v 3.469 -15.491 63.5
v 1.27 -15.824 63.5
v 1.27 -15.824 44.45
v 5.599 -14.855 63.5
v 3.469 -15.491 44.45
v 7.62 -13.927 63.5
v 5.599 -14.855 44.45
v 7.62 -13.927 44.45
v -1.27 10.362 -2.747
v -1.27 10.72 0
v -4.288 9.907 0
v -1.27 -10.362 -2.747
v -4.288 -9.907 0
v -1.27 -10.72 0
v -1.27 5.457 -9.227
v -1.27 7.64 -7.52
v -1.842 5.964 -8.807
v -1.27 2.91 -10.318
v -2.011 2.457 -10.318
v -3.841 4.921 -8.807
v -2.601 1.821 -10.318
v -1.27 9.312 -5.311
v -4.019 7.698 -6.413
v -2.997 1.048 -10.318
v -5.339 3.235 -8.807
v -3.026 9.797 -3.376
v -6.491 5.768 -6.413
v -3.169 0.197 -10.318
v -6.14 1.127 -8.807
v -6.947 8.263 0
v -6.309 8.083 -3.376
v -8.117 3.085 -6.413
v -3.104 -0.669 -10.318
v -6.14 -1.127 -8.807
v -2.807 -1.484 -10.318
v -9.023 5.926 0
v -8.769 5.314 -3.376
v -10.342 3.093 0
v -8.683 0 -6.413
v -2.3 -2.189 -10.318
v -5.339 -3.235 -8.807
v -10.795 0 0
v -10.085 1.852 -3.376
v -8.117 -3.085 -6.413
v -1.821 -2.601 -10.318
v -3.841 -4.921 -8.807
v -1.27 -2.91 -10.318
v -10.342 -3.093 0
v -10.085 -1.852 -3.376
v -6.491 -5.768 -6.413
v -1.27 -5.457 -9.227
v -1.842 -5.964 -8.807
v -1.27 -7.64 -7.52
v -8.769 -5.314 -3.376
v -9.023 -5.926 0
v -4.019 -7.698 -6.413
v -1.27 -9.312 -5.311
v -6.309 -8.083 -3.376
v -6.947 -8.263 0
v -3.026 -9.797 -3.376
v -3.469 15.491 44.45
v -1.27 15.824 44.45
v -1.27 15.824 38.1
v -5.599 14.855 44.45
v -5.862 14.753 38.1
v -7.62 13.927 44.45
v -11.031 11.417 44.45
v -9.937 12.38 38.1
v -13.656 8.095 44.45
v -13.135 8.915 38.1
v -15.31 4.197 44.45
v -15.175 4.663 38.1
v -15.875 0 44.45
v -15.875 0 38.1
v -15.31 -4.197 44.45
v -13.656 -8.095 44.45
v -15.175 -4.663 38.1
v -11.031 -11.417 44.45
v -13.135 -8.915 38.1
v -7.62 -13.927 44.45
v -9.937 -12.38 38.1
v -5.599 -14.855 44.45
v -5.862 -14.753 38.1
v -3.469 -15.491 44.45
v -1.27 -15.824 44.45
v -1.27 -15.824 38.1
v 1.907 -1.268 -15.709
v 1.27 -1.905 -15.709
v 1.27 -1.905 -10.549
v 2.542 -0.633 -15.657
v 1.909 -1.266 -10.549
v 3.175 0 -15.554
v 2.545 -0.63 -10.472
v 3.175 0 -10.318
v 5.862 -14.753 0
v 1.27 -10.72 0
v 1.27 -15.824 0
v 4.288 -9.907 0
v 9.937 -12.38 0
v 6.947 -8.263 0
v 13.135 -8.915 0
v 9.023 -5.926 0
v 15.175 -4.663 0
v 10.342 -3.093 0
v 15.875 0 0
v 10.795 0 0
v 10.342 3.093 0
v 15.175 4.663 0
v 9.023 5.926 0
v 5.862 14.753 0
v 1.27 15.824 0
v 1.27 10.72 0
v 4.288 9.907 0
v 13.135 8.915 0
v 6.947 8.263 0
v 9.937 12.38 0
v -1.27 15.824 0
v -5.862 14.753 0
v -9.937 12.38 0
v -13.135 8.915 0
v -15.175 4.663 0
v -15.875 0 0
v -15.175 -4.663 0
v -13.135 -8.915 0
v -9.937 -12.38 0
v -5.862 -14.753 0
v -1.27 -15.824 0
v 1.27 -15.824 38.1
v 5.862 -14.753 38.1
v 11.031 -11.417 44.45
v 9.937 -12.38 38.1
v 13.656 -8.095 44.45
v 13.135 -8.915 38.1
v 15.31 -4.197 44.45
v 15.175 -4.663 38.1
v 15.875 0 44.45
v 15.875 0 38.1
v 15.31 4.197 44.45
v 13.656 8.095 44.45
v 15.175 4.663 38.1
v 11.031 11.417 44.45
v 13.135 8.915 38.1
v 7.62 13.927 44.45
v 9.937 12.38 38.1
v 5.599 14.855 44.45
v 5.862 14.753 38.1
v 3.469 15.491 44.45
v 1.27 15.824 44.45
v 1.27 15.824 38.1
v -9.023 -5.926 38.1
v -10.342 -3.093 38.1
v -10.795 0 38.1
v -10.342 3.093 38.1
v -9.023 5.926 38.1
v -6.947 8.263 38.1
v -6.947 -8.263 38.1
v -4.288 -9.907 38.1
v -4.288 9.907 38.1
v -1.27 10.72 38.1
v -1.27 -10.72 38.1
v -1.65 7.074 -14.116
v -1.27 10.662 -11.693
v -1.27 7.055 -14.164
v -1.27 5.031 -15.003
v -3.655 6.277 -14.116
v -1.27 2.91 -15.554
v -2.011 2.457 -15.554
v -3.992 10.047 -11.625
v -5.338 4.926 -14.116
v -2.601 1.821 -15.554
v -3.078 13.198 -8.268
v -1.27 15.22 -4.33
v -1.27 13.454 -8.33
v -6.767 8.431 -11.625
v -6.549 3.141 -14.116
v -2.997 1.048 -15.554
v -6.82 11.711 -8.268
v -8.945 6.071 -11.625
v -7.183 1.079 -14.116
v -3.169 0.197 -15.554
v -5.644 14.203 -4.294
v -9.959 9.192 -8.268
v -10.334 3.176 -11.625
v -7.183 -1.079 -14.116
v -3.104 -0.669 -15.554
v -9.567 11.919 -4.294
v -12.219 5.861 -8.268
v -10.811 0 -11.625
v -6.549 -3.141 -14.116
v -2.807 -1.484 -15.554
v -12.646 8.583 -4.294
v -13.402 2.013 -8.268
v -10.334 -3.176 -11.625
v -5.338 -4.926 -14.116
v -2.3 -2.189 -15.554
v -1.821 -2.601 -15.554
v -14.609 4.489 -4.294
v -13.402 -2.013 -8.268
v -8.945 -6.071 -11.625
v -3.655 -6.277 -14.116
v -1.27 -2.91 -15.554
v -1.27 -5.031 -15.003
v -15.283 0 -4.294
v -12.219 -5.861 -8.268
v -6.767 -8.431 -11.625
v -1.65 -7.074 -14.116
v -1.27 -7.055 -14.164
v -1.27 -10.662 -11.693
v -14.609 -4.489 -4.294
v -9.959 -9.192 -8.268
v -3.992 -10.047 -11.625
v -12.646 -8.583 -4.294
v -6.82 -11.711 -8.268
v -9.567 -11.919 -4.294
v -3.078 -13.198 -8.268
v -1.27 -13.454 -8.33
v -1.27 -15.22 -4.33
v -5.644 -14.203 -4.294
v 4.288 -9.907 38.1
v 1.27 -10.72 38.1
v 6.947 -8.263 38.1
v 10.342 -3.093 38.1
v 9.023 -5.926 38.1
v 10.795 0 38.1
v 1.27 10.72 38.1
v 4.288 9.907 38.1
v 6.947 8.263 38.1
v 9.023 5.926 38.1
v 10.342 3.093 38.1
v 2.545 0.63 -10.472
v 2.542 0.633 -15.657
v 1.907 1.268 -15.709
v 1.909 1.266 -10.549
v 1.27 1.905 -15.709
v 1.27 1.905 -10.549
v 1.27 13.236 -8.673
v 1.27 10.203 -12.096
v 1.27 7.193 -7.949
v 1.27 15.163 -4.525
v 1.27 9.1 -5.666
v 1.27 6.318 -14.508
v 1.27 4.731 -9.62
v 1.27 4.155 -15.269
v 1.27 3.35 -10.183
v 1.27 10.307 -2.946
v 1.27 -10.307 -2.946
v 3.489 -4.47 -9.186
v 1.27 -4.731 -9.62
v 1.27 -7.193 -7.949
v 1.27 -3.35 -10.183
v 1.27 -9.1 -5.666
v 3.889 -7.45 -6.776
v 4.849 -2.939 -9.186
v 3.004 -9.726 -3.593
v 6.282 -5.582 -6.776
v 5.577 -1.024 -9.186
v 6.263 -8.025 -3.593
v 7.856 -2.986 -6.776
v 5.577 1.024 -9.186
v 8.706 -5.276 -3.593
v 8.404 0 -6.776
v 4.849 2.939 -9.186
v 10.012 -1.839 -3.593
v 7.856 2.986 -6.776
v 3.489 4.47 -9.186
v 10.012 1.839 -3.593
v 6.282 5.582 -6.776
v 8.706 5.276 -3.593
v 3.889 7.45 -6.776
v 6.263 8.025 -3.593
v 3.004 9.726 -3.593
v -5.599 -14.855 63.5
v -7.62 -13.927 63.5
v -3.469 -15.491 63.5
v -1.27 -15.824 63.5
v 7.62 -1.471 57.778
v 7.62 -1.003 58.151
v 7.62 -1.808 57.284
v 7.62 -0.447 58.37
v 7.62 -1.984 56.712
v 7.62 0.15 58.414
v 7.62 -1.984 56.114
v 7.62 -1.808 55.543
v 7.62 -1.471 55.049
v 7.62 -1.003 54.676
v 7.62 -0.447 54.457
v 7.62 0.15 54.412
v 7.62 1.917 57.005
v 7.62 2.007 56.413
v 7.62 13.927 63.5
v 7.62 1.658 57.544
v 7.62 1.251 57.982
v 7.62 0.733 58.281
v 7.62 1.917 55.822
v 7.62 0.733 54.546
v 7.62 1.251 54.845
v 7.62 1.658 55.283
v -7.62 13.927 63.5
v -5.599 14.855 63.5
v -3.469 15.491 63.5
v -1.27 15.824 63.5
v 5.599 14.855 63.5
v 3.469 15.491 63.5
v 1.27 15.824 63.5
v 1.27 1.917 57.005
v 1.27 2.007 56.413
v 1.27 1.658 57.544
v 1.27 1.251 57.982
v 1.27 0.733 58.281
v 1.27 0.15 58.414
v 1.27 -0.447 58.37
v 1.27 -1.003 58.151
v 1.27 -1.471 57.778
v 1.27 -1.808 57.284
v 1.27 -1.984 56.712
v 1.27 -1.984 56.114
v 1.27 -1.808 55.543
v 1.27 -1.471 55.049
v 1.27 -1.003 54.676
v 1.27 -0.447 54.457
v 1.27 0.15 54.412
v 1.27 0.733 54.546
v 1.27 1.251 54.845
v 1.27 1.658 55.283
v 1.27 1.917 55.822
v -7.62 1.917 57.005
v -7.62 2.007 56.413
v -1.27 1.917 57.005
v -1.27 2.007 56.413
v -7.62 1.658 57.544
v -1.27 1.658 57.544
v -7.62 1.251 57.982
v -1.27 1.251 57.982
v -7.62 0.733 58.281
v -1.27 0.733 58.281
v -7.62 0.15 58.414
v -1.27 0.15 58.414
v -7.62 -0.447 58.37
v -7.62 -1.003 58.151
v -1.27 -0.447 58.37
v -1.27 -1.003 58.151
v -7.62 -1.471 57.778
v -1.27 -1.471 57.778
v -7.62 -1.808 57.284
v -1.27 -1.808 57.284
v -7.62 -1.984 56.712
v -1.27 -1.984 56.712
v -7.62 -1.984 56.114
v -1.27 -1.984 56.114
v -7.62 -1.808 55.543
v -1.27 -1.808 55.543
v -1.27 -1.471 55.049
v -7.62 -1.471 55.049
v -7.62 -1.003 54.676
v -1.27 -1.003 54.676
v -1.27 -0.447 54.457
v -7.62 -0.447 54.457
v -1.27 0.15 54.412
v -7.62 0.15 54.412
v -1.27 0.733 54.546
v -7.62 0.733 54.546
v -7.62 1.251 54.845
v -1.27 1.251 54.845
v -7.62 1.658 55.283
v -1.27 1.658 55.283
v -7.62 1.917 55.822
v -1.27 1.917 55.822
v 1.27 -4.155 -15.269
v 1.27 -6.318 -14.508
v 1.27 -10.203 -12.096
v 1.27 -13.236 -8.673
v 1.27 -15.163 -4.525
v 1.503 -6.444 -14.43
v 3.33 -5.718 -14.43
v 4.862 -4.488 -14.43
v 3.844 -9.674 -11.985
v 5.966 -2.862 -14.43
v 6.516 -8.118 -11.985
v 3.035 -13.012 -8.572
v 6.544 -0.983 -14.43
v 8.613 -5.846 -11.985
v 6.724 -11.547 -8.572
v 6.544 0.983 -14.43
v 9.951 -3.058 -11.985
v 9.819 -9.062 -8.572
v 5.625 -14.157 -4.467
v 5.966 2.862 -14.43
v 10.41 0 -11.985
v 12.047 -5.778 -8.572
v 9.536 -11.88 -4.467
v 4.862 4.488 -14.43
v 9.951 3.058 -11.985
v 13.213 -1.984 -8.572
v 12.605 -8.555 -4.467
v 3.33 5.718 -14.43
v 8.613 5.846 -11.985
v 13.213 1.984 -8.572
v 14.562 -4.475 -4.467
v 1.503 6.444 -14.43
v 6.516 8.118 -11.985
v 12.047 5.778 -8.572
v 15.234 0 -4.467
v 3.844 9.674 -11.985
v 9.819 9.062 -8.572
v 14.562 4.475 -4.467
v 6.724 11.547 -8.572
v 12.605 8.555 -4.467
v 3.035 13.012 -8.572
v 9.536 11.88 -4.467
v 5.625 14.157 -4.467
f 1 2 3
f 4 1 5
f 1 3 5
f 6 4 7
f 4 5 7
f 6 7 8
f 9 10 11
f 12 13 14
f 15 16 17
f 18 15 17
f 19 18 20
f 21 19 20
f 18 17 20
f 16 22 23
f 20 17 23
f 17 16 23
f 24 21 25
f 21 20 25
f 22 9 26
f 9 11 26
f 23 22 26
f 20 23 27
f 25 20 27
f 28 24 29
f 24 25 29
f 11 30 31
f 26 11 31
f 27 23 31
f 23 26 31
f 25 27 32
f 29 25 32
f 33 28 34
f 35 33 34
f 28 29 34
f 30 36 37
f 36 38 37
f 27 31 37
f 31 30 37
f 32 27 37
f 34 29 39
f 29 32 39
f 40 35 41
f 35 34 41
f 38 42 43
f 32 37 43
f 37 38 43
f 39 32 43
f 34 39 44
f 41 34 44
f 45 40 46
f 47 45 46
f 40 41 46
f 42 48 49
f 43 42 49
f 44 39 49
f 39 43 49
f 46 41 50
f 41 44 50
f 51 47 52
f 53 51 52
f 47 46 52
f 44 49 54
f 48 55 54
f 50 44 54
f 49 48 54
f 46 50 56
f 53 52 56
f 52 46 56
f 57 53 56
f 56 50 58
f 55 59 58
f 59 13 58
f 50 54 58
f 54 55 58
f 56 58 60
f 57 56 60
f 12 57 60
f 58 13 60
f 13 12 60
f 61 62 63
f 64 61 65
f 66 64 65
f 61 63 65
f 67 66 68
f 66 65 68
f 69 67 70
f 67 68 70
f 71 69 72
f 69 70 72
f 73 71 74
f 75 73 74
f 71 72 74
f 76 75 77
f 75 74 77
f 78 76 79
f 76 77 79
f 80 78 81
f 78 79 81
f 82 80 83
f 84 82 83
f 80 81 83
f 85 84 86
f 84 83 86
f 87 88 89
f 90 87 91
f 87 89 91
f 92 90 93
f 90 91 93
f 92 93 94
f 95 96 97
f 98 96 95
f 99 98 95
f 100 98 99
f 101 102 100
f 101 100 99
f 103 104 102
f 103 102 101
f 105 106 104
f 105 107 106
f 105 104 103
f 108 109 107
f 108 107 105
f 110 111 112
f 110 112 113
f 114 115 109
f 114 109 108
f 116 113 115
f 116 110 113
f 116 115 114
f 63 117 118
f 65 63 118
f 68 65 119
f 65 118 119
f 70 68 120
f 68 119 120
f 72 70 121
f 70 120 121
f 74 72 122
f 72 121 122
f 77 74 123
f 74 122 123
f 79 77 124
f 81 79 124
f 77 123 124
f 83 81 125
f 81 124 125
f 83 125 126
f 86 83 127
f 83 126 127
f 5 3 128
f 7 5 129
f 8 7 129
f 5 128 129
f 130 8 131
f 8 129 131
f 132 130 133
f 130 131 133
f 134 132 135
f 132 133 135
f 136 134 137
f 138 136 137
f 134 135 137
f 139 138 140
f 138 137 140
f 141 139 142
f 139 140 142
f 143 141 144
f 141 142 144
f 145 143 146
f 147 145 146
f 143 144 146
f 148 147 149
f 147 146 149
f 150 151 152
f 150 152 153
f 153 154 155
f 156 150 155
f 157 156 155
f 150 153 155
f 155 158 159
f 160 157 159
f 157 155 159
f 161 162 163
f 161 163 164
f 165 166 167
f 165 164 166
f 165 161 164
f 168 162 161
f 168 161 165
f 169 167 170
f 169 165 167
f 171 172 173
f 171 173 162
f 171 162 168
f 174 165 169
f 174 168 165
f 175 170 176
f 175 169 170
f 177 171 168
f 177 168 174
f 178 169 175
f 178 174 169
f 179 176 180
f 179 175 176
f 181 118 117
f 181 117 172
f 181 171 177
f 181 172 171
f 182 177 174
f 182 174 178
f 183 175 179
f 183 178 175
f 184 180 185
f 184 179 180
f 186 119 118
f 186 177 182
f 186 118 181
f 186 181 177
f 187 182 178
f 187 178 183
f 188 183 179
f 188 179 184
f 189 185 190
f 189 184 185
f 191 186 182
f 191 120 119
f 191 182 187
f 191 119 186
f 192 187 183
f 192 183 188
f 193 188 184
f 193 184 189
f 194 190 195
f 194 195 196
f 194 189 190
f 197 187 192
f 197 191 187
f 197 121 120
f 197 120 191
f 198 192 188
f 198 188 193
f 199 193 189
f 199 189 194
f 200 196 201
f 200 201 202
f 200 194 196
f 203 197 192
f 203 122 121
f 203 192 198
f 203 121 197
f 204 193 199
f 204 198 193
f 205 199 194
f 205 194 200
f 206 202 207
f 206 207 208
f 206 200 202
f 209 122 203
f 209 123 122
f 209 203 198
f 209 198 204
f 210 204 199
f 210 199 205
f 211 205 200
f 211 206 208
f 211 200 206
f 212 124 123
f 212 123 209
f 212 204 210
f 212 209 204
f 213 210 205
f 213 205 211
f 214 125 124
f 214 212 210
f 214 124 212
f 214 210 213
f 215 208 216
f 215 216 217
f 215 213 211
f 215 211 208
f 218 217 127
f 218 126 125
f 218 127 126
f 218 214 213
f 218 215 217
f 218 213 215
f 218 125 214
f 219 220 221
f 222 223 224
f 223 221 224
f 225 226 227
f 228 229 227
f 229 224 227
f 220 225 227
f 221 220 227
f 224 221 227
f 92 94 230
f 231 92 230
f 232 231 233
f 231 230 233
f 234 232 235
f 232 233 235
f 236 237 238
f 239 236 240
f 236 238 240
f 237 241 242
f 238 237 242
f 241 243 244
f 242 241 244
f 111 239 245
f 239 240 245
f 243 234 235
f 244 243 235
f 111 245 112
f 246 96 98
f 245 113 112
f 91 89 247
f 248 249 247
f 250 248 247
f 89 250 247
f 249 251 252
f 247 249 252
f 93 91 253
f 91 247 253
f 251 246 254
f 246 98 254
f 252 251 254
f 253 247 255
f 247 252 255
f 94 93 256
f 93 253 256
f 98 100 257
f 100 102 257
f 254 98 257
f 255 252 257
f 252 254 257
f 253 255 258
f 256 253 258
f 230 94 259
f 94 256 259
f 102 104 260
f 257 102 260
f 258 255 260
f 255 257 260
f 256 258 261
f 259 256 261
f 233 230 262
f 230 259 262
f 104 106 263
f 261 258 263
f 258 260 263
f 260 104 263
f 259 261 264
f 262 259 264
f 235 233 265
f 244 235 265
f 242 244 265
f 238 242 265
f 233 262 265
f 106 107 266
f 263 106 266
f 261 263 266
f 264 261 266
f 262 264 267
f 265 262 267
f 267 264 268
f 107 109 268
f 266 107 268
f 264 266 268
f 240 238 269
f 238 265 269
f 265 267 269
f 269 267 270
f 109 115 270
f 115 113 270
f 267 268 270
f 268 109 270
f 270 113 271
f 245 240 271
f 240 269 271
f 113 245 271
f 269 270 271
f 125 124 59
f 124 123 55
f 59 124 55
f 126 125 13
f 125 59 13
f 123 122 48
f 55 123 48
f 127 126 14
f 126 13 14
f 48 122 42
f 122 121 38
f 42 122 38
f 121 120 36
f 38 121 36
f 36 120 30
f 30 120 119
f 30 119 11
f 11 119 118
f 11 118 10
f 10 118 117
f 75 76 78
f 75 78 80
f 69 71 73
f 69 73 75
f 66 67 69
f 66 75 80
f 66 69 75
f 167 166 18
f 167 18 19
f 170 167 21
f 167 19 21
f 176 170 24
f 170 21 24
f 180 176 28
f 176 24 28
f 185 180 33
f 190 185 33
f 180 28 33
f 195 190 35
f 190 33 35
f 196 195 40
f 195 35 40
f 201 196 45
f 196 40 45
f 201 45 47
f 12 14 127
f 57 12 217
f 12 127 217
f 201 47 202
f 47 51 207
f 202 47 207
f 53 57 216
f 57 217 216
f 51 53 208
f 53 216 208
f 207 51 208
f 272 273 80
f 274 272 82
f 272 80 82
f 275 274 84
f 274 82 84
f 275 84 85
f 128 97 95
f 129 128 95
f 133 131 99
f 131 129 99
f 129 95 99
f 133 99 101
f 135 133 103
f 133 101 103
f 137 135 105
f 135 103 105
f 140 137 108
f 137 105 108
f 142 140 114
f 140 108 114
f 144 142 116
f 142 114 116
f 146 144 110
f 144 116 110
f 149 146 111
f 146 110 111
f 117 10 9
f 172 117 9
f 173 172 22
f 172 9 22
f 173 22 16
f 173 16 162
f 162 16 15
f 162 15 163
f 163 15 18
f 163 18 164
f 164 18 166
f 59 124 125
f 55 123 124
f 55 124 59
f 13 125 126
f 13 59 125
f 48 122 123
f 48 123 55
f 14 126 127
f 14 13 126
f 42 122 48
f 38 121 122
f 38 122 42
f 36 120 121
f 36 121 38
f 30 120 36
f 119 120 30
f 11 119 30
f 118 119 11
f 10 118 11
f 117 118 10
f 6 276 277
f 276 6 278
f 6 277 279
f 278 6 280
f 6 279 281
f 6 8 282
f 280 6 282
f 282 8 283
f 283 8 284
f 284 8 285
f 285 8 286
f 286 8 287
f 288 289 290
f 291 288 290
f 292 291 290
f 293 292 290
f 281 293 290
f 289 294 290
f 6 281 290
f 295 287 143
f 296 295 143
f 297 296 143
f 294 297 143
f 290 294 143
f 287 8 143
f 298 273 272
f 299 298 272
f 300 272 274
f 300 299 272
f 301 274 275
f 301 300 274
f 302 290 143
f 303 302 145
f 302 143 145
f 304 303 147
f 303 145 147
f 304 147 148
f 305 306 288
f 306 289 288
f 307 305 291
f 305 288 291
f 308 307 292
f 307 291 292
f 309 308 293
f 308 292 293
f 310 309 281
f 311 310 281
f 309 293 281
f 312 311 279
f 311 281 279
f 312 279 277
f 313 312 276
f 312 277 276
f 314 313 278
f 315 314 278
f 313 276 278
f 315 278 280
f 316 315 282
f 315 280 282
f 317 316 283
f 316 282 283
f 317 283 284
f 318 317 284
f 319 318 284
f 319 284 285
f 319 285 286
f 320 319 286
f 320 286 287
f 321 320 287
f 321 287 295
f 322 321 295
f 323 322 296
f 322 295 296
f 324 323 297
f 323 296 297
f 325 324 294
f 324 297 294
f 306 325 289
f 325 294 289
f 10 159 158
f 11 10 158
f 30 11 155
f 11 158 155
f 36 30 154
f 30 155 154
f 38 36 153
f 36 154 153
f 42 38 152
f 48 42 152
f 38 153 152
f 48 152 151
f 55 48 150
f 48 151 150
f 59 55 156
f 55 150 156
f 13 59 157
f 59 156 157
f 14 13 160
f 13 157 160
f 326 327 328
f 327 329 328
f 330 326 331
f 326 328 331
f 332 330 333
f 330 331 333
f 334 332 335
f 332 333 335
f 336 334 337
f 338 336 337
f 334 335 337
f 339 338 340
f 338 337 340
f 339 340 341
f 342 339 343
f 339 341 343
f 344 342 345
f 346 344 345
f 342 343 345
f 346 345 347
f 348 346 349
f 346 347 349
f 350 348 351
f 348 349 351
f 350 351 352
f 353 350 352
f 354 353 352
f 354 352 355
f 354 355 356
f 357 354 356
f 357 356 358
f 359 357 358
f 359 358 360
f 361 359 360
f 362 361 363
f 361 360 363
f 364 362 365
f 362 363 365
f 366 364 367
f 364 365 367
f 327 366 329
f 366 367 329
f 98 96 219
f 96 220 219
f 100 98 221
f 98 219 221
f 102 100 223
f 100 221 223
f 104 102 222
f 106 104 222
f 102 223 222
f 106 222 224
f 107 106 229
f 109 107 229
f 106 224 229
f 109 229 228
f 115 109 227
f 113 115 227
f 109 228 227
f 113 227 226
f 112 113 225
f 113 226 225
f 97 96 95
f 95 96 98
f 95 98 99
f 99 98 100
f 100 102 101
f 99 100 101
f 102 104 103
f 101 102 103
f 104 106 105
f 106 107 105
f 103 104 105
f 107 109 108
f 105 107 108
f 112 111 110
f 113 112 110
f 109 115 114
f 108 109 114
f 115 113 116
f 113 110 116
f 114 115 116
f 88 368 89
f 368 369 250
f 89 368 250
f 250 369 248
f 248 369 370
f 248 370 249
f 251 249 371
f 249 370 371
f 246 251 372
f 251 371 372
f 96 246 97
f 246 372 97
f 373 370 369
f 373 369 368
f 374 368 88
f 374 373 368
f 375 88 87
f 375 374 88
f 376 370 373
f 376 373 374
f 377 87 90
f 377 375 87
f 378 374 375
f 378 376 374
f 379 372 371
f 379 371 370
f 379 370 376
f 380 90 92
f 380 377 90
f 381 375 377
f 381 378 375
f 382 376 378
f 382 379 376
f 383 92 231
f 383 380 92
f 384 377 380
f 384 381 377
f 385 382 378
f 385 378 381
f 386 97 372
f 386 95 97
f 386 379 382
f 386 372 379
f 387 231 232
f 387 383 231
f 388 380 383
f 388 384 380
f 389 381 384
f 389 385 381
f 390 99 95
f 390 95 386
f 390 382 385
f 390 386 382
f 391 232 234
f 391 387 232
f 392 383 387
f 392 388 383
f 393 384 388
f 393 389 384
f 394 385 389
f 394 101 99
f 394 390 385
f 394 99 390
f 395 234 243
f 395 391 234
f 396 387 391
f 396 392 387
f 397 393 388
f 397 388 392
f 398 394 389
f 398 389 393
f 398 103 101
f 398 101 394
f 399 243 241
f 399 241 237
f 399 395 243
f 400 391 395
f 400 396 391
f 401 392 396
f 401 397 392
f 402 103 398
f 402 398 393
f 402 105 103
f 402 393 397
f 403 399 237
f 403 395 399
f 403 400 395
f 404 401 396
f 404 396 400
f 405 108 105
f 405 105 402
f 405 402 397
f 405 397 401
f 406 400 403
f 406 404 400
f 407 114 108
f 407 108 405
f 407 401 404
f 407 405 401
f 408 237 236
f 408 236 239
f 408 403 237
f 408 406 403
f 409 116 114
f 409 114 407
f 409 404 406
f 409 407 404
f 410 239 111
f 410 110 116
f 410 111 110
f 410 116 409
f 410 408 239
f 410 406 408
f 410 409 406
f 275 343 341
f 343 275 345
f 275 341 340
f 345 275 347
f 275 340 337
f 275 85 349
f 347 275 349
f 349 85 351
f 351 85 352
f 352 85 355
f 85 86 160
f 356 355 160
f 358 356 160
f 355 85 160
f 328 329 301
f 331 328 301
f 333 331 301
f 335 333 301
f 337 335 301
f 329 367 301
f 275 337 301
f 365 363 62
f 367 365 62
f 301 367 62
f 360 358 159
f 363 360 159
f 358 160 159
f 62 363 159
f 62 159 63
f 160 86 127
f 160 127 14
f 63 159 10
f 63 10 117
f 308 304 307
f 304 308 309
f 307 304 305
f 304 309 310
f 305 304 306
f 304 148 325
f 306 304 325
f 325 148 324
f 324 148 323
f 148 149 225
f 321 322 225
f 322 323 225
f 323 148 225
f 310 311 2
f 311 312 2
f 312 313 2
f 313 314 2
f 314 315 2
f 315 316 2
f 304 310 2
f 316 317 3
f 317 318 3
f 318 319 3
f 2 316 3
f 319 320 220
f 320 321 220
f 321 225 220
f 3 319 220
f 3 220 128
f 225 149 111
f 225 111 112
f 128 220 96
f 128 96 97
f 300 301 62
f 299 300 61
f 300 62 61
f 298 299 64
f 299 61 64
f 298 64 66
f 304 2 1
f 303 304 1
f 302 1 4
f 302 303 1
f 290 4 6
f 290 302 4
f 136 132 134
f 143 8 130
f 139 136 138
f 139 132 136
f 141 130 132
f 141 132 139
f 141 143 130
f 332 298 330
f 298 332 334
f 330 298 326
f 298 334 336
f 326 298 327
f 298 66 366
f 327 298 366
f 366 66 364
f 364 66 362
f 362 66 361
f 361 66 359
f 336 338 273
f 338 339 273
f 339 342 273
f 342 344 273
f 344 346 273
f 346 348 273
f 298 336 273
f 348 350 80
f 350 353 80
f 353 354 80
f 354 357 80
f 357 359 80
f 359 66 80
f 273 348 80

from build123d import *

# Parameters (mm, degrees)
F0_R      = 15.875
F1_DEPTH  = 38.1
F4_T      = -5.08
F6_DEPTH  = 25.4
F7_R      = 10.795
F8_DEPTH  = 40.64
F10_DEPTH = 25.4
F12_DEPTH = 19.05
F14_DEPTH = 6.35
F16_DEPTH = 19.05
F17_R     = 2.0066
F18_DEPTH = 12.7


with BuildPart() as f1:
    # F0 (on Top) → F1 (new body)
    with BuildSketch(Plane.XY):
        Circle(F0_R)
    extrude(amount=F1_DEPTH)


with BuildPart() as f3:
    # F2 (on Front) → F3 (revolve)
    with BuildSketch(Plane.XZ):
        with BuildLine():
            Line((0, 0), (0, -15.875))
            ThreePointArc((0, -15.875), (11.2253201513, -11.2253201513), (15.875, 0))
            Line((15.875, 0), (0, 0))
        make_face()
    revolve(axis=Axis((0, 0, 8.2880207126), (0, 0, 1)))

    # F4
    f4_openings = [f3.faces().sort_by_distance(p)[0] for p in [
        (0, 0, 0),
    ]]
    offset(amount=F4_T, openings=f4_openings)

    # F5 (on Top) → F6 (cut)
    with BuildSketch(Plane.XY):
        with BuildLine():
            Line((0, -3.175), (0, 3.175))
            ThreePointArc((0, 3.175), (-3.175, 0), (0, -3.175))
        make_face()
    extrude(amount=-F6_DEPTH, mode=Mode.SUBTRACT)


with BuildPart() as f8_tool:
    # F7 (on face) → F8 (new body)
    with BuildSketch(Plane.XY.offset(38.1)):
        Circle(F7_R)
    extrude(amount=-F8_DEPTH)


with BuildPart() as f1_1:
    add(f1.part)

    # F8: cut by f8_tool
    add(f8_tool.part, mode=Mode.SUBTRACT)


with BuildPart() as f3_1:
    add(f3.part)

    # F8: cut by f8_tool
    add(f8_tool.part, mode=Mode.SUBTRACT)

    # F9 (on Top) → F10 (cut)
    with BuildSketch(Plane.XY):
        Polygon((0, 3.175), (0, 0), (0, -3.175), (3.175, 0), align=None)
    extrude(amount=-F10_DEPTH, mode=Mode.SUBTRACT)


with BuildPart() as f12_tool:
    # F11 (on Front) → F12 (new body, symmetric)
    with BuildSketch(Plane.XZ):
        Polygon((-1.27, 38.5606661439), (-1.27, 37.9755608737), (-1.27, -17.0012097806), (1.27, -17.0012097806), (1.27, 37.9755608737), (1.27, 38.5606661439), align=None)
    extrude(amount=F12_DEPTH, both=True)


with BuildPart() as f1_2:
    add(f1_1.part)

    # F12: cut by f12_tool
    add(f12_tool.part, mode=Mode.SUBTRACT)

    # F13 (on face) → F14 (join)
    with BuildSketch(Plane.XY.offset(38.1)):
        with BuildLine():
            Line((-1.27, -15.8241184589), (-1.27, 15.8241184589))
            ThreePointArc((-1.27, 15.8241184589), (-15.875, 0), (-1.27, -15.8241184589))
        make_face()
        with BuildLine():
            ThreePointArc((1.27, -15.8241184589), (15.875, 0), (1.27, 15.8241184589))
            Line((1.27, 15.8241184589), (1.27, -15.8241184589))
        make_face()
    extrude(amount=F14_DEPTH)

    # F15 (on face) → F16 (join)
    with BuildSketch(Plane.XY.offset(44.45)):
        with BuildLine():
            Line((-1.27, -15.8241184589), (-1.27, 15.8241184589))
            ThreePointArc((-1.27, 15.8241184589), (-4.5451219717, 15.2104402061), (-7.62, 13.9266372467))
            Line((-7.62, 13.9266372467), (-7.62, -13.9266372467))
            ThreePointArc((-7.62, -13.9266372467), (-4.5451219717, -15.2104402061), (-1.27, -15.8241184589))
        make_face()
        with BuildLine():
            ThreePointArc((7.62, 13.9266372467), (4.5451219717, 15.2104402061), (1.27, 15.8241184589))
            Line((1.27, 15.8241184589), (1.27, -15.8241184589))
            ThreePointArc((1.27, -15.8241184589), (4.5451219717, -15.2104402061), (7.62, -13.9266372467))
            Line((7.62, -13.9266372467), (7.62, 13.9266372467))
        make_face()
    extrude(amount=F16_DEPTH)

    # F17 (on Right) → F18 (cut, symmetric)
    with BuildSketch(Plane.YZ):
        with Locations((0, 56.4134)):
            Circle(F17_R)
    extrude(amount=F18_DEPTH, both=True, mode=Mode.SUBTRACT)


with BuildPart() as f3_2:
    add(f3_1.part)

    # F12: cut by f12_tool
    add(f12_tool.part, mode=Mode.SUBTRACT)


solid = Compound([f1_2.part, f3_2.part])
